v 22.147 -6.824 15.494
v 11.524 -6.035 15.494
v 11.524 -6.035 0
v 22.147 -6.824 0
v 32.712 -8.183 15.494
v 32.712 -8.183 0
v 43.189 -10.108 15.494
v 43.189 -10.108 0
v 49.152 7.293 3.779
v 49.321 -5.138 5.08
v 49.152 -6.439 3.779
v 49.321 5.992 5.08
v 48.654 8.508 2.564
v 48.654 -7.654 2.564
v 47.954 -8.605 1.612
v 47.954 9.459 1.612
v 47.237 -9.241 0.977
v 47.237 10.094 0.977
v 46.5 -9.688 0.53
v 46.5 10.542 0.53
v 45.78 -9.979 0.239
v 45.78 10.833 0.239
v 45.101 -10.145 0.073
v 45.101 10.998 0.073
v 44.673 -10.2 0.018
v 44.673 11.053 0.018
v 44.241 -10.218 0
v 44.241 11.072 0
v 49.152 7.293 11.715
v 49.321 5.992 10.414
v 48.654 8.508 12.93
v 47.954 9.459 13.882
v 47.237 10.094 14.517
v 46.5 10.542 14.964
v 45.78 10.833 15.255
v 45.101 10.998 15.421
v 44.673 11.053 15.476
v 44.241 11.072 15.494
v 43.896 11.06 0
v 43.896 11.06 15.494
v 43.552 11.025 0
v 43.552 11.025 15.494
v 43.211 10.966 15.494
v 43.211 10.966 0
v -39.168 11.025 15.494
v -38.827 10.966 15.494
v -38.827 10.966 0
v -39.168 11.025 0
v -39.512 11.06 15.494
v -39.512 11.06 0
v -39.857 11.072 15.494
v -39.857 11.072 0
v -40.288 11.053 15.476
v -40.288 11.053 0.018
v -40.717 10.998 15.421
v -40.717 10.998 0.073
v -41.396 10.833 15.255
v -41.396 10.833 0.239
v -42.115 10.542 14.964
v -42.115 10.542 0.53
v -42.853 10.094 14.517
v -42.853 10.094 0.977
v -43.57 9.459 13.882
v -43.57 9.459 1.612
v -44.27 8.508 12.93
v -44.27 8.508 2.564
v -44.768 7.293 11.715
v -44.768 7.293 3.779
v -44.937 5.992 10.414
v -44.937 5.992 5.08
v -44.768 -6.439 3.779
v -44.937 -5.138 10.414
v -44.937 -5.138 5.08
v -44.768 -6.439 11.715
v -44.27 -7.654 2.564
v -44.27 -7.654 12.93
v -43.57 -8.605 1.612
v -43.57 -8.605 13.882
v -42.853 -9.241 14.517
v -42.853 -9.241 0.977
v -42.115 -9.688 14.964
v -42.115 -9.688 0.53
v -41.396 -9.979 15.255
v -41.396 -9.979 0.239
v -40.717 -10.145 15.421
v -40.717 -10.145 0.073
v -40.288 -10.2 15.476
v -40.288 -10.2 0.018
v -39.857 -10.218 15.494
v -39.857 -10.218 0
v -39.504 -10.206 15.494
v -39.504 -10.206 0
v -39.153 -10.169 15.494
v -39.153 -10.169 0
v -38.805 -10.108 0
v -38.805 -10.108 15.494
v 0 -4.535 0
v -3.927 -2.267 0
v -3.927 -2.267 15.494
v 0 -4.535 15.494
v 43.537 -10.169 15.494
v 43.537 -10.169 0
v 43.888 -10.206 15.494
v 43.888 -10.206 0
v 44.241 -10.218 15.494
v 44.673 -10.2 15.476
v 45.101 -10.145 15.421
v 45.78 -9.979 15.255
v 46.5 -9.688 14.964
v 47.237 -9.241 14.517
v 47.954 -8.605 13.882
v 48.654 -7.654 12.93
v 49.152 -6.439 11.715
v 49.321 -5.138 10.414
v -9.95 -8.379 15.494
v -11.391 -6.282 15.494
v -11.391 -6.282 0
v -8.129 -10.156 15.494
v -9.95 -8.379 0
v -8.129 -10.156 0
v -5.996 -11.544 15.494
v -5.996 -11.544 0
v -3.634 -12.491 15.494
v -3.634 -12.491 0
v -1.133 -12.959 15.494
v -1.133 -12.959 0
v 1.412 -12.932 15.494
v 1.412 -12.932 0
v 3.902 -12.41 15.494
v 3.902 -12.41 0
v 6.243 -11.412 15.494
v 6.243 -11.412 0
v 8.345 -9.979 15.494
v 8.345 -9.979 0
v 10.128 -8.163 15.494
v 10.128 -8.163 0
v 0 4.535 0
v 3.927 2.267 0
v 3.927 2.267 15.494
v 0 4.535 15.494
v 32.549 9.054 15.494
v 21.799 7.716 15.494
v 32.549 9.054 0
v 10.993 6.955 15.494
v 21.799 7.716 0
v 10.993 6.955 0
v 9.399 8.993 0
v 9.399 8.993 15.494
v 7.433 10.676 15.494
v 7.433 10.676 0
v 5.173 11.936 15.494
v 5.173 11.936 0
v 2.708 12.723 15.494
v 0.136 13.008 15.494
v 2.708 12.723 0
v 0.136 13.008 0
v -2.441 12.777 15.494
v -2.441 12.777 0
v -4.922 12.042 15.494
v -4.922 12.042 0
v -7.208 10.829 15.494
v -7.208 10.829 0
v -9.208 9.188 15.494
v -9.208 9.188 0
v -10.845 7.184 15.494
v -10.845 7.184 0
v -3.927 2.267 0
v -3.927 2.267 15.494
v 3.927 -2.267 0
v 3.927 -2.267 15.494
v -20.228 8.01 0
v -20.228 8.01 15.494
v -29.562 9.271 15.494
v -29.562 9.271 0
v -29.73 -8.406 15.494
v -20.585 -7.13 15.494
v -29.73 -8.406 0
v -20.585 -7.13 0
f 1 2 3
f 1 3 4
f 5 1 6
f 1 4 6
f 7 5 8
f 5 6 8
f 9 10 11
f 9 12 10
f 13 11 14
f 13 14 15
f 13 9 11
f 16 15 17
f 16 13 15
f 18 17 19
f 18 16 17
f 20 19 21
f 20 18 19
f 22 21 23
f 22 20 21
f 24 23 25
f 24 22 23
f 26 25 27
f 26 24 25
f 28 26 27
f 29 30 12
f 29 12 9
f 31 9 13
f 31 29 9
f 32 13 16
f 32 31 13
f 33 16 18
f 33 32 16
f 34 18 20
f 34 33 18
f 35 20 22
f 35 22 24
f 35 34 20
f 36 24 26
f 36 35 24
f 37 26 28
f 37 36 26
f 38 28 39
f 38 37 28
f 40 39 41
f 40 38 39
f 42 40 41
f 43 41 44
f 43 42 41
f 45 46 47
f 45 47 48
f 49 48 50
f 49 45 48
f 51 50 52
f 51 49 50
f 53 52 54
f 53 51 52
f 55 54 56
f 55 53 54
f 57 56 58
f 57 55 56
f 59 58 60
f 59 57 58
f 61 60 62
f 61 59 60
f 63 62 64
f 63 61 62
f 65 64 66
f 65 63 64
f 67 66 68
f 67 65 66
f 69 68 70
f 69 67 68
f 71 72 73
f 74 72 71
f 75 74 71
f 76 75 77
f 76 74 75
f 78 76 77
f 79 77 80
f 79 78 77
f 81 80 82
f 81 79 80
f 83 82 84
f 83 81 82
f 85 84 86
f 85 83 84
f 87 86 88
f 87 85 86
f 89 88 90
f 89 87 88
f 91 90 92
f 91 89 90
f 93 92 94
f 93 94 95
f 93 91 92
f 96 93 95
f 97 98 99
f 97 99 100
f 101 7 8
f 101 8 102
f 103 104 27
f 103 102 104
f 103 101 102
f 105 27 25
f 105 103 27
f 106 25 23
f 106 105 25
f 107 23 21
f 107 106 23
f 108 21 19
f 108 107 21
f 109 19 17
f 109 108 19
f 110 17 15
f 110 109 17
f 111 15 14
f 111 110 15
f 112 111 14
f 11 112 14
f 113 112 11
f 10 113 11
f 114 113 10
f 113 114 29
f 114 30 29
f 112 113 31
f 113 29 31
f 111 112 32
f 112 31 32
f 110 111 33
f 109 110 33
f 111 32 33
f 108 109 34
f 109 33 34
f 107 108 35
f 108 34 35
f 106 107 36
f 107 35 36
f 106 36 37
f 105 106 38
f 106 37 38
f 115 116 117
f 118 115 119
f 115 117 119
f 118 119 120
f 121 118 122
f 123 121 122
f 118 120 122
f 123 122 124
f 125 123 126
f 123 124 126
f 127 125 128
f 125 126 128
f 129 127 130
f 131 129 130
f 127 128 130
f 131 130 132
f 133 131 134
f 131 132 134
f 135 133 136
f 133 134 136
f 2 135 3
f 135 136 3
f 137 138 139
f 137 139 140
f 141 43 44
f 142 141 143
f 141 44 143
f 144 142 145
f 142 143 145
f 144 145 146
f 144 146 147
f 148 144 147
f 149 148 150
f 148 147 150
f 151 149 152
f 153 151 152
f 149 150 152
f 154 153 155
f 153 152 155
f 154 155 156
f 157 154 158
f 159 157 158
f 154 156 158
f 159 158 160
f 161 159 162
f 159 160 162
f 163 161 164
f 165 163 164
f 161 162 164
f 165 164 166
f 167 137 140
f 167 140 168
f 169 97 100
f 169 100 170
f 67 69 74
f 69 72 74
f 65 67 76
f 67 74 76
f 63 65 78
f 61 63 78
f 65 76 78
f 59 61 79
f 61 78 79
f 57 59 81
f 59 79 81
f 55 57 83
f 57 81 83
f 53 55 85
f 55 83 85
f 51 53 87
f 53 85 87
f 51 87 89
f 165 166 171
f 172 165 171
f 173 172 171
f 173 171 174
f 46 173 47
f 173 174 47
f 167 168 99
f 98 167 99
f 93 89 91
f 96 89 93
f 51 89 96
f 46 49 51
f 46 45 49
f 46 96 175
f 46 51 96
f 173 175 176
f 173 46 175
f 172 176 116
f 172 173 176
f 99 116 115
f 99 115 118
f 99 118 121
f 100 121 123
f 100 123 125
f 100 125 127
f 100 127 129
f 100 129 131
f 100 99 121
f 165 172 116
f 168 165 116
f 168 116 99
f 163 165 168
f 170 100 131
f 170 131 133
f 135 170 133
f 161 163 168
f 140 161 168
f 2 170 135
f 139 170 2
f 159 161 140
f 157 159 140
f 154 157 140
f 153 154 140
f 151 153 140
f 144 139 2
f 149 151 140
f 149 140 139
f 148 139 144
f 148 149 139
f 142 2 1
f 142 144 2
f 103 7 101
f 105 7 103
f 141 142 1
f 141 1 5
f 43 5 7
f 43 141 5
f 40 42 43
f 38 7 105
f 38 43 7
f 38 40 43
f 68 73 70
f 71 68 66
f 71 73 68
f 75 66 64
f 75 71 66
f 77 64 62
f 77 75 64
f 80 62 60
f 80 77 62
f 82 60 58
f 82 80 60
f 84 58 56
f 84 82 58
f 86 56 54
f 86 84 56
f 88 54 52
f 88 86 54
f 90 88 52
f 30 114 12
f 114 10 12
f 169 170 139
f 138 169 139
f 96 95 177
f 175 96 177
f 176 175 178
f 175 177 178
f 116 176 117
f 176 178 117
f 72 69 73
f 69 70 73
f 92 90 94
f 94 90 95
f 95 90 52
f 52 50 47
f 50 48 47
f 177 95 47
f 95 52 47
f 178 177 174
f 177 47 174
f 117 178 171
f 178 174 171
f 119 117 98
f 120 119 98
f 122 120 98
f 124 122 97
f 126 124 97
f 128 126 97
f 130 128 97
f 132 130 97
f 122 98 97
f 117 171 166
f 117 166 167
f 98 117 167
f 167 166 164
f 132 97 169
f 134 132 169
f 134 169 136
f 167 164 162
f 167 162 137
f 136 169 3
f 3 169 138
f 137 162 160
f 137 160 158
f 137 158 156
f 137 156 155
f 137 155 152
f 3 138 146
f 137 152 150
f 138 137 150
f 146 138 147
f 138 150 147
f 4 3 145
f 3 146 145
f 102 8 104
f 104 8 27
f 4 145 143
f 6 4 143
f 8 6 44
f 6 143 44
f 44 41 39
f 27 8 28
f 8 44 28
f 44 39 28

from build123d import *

# Parameters (mm, degrees)
F1_DEPTH = 15.494
F2_R     = 5.08
F4_DEPTH = 15.495


# Not quite as in the source:
# - a feature names something its author has since deleted; it is built from what else it names


with BuildPart() as f1:
    # F0 (on Top) → F1 (new body)
    with BuildSketch(Plane.XY):
        with BuildLine():
            ThreePointArc((-10.8447933041, 7.1841250258), (-28.0007995808, 9.0295397064), (-44.9371226132, 12.3303076252))
            Line((-44.9371226132, 12.3303076252), (-44.9371226132, -11.5082878619))
            ThreePointArc((-44.9371226132, -11.5082878619), (-28.2764136106, -8.174493828), (-11.391166434, -6.2819202055))
            ThreePointArc((-11.391166434, -6.2819202055), (-12.9978101968, 0.5273748986), (-10.8447933041, 7.1841250258))
        make_face()
        with BuildLine():
            ThreePointArc((10.9930542238, 6.9551386059), (0.1363965549, 13.007789596), (-10.8447933041, 7.1841250258))
            ThreePointArc((-10.8447933041, 7.1841250258), (0.0710380129, 6.7747130853), (10.9930542238, 6.9551386059))
        make_face()
        with BuildLine():
            ThreePointArc((10.9930542238, 6.9551386059), (0.0710380129, 6.7747130853), (-10.8447933041, 7.1841250258))
            ThreePointArc((-10.8447933041, 7.1841250258), (-12.9978101968, 0.5273748986), (-11.391166434, -6.2819202055))
            ThreePointArc((-11.391166434, -6.2819202055), (0.0626903929, -5.8267272063), (11.5236895742, -6.035376773))
            ThreePointArc((11.5236895742, -6.035376773), (12.6318479257, -3.1076698953), (13.0085046871, 0))
            ThreePointArc((13.0085046871, 0), (12.4944866159, 3.6206350823), (10.9930542238, 6.9551386059))
        make_face()
        with BuildLine():
            ThreePointArc((11.5236895742, -6.035376773), (0.0626903929, -5.8267272063), (-11.391166434, -6.2819202055))
            ThreePointArc((-11.391166434, -6.2819202055), (0.1399518192, -13.0077518305), (11.5236895742, -6.035376773))
        make_face()
        with BuildLine():
            ThreePointArc((49.3212305009, 12.3303076252), (30.2859906696, 8.7239574701), (10.9930542238, 6.9551386059))
            ThreePointArc((10.9930542238, 6.9551386059), (12.4944866159, 3.6206350823), (13.0085046871, 0))
            ThreePointArc((13.0085046871, 0), (12.6318479257, -3.1076698953), (11.5236895742, -6.035376773))
            ThreePointArc((11.5236895742, -6.035376773), (30.5547762597, -7.8580173956), (49.3212305009, -11.5082878619))
            Line((49.3212305009, -11.5082878619), (49.3212305009, 12.3303076252))
        make_face()
    extrude(amount=F1_DEPTH)

    # F2
    f2_edges = [f1.edges().sort_by_distance(p)[0] for p in [
        (-44.937123, 0.41101, 15.494),
        (49.321231, 0.41101, 15.494),
        (-44.937123, 0.41101, 0),
        (49.321231, 0.41101, 0),
        (-44.937123, 12.330308, 7.747),
        (-44.937123, -11.508288, 7.747),
        (49.321231, -11.508288, 7.747),
        (49.321231, 12.330308, 7.747),
    ]]
    fillet(f2_edges, radius=F2_R)

    # F3 (on face) → F4 (cut, through all)
    with BuildSketch(Plane.XY.offset(15.494)):
        Polygon((3.9274184965, -2.2674961262), (3.9274184965, 2.2674961262), (0, 4.5349922523), (-3.9274184965, 2.2674961262), (-3.9274184965, -2.2674961262), (0, -4.5349922523), align=None)
    extrude(amount=-F4_DEPTH, mode=Mode.SUBTRACT)


solid = f1.part
